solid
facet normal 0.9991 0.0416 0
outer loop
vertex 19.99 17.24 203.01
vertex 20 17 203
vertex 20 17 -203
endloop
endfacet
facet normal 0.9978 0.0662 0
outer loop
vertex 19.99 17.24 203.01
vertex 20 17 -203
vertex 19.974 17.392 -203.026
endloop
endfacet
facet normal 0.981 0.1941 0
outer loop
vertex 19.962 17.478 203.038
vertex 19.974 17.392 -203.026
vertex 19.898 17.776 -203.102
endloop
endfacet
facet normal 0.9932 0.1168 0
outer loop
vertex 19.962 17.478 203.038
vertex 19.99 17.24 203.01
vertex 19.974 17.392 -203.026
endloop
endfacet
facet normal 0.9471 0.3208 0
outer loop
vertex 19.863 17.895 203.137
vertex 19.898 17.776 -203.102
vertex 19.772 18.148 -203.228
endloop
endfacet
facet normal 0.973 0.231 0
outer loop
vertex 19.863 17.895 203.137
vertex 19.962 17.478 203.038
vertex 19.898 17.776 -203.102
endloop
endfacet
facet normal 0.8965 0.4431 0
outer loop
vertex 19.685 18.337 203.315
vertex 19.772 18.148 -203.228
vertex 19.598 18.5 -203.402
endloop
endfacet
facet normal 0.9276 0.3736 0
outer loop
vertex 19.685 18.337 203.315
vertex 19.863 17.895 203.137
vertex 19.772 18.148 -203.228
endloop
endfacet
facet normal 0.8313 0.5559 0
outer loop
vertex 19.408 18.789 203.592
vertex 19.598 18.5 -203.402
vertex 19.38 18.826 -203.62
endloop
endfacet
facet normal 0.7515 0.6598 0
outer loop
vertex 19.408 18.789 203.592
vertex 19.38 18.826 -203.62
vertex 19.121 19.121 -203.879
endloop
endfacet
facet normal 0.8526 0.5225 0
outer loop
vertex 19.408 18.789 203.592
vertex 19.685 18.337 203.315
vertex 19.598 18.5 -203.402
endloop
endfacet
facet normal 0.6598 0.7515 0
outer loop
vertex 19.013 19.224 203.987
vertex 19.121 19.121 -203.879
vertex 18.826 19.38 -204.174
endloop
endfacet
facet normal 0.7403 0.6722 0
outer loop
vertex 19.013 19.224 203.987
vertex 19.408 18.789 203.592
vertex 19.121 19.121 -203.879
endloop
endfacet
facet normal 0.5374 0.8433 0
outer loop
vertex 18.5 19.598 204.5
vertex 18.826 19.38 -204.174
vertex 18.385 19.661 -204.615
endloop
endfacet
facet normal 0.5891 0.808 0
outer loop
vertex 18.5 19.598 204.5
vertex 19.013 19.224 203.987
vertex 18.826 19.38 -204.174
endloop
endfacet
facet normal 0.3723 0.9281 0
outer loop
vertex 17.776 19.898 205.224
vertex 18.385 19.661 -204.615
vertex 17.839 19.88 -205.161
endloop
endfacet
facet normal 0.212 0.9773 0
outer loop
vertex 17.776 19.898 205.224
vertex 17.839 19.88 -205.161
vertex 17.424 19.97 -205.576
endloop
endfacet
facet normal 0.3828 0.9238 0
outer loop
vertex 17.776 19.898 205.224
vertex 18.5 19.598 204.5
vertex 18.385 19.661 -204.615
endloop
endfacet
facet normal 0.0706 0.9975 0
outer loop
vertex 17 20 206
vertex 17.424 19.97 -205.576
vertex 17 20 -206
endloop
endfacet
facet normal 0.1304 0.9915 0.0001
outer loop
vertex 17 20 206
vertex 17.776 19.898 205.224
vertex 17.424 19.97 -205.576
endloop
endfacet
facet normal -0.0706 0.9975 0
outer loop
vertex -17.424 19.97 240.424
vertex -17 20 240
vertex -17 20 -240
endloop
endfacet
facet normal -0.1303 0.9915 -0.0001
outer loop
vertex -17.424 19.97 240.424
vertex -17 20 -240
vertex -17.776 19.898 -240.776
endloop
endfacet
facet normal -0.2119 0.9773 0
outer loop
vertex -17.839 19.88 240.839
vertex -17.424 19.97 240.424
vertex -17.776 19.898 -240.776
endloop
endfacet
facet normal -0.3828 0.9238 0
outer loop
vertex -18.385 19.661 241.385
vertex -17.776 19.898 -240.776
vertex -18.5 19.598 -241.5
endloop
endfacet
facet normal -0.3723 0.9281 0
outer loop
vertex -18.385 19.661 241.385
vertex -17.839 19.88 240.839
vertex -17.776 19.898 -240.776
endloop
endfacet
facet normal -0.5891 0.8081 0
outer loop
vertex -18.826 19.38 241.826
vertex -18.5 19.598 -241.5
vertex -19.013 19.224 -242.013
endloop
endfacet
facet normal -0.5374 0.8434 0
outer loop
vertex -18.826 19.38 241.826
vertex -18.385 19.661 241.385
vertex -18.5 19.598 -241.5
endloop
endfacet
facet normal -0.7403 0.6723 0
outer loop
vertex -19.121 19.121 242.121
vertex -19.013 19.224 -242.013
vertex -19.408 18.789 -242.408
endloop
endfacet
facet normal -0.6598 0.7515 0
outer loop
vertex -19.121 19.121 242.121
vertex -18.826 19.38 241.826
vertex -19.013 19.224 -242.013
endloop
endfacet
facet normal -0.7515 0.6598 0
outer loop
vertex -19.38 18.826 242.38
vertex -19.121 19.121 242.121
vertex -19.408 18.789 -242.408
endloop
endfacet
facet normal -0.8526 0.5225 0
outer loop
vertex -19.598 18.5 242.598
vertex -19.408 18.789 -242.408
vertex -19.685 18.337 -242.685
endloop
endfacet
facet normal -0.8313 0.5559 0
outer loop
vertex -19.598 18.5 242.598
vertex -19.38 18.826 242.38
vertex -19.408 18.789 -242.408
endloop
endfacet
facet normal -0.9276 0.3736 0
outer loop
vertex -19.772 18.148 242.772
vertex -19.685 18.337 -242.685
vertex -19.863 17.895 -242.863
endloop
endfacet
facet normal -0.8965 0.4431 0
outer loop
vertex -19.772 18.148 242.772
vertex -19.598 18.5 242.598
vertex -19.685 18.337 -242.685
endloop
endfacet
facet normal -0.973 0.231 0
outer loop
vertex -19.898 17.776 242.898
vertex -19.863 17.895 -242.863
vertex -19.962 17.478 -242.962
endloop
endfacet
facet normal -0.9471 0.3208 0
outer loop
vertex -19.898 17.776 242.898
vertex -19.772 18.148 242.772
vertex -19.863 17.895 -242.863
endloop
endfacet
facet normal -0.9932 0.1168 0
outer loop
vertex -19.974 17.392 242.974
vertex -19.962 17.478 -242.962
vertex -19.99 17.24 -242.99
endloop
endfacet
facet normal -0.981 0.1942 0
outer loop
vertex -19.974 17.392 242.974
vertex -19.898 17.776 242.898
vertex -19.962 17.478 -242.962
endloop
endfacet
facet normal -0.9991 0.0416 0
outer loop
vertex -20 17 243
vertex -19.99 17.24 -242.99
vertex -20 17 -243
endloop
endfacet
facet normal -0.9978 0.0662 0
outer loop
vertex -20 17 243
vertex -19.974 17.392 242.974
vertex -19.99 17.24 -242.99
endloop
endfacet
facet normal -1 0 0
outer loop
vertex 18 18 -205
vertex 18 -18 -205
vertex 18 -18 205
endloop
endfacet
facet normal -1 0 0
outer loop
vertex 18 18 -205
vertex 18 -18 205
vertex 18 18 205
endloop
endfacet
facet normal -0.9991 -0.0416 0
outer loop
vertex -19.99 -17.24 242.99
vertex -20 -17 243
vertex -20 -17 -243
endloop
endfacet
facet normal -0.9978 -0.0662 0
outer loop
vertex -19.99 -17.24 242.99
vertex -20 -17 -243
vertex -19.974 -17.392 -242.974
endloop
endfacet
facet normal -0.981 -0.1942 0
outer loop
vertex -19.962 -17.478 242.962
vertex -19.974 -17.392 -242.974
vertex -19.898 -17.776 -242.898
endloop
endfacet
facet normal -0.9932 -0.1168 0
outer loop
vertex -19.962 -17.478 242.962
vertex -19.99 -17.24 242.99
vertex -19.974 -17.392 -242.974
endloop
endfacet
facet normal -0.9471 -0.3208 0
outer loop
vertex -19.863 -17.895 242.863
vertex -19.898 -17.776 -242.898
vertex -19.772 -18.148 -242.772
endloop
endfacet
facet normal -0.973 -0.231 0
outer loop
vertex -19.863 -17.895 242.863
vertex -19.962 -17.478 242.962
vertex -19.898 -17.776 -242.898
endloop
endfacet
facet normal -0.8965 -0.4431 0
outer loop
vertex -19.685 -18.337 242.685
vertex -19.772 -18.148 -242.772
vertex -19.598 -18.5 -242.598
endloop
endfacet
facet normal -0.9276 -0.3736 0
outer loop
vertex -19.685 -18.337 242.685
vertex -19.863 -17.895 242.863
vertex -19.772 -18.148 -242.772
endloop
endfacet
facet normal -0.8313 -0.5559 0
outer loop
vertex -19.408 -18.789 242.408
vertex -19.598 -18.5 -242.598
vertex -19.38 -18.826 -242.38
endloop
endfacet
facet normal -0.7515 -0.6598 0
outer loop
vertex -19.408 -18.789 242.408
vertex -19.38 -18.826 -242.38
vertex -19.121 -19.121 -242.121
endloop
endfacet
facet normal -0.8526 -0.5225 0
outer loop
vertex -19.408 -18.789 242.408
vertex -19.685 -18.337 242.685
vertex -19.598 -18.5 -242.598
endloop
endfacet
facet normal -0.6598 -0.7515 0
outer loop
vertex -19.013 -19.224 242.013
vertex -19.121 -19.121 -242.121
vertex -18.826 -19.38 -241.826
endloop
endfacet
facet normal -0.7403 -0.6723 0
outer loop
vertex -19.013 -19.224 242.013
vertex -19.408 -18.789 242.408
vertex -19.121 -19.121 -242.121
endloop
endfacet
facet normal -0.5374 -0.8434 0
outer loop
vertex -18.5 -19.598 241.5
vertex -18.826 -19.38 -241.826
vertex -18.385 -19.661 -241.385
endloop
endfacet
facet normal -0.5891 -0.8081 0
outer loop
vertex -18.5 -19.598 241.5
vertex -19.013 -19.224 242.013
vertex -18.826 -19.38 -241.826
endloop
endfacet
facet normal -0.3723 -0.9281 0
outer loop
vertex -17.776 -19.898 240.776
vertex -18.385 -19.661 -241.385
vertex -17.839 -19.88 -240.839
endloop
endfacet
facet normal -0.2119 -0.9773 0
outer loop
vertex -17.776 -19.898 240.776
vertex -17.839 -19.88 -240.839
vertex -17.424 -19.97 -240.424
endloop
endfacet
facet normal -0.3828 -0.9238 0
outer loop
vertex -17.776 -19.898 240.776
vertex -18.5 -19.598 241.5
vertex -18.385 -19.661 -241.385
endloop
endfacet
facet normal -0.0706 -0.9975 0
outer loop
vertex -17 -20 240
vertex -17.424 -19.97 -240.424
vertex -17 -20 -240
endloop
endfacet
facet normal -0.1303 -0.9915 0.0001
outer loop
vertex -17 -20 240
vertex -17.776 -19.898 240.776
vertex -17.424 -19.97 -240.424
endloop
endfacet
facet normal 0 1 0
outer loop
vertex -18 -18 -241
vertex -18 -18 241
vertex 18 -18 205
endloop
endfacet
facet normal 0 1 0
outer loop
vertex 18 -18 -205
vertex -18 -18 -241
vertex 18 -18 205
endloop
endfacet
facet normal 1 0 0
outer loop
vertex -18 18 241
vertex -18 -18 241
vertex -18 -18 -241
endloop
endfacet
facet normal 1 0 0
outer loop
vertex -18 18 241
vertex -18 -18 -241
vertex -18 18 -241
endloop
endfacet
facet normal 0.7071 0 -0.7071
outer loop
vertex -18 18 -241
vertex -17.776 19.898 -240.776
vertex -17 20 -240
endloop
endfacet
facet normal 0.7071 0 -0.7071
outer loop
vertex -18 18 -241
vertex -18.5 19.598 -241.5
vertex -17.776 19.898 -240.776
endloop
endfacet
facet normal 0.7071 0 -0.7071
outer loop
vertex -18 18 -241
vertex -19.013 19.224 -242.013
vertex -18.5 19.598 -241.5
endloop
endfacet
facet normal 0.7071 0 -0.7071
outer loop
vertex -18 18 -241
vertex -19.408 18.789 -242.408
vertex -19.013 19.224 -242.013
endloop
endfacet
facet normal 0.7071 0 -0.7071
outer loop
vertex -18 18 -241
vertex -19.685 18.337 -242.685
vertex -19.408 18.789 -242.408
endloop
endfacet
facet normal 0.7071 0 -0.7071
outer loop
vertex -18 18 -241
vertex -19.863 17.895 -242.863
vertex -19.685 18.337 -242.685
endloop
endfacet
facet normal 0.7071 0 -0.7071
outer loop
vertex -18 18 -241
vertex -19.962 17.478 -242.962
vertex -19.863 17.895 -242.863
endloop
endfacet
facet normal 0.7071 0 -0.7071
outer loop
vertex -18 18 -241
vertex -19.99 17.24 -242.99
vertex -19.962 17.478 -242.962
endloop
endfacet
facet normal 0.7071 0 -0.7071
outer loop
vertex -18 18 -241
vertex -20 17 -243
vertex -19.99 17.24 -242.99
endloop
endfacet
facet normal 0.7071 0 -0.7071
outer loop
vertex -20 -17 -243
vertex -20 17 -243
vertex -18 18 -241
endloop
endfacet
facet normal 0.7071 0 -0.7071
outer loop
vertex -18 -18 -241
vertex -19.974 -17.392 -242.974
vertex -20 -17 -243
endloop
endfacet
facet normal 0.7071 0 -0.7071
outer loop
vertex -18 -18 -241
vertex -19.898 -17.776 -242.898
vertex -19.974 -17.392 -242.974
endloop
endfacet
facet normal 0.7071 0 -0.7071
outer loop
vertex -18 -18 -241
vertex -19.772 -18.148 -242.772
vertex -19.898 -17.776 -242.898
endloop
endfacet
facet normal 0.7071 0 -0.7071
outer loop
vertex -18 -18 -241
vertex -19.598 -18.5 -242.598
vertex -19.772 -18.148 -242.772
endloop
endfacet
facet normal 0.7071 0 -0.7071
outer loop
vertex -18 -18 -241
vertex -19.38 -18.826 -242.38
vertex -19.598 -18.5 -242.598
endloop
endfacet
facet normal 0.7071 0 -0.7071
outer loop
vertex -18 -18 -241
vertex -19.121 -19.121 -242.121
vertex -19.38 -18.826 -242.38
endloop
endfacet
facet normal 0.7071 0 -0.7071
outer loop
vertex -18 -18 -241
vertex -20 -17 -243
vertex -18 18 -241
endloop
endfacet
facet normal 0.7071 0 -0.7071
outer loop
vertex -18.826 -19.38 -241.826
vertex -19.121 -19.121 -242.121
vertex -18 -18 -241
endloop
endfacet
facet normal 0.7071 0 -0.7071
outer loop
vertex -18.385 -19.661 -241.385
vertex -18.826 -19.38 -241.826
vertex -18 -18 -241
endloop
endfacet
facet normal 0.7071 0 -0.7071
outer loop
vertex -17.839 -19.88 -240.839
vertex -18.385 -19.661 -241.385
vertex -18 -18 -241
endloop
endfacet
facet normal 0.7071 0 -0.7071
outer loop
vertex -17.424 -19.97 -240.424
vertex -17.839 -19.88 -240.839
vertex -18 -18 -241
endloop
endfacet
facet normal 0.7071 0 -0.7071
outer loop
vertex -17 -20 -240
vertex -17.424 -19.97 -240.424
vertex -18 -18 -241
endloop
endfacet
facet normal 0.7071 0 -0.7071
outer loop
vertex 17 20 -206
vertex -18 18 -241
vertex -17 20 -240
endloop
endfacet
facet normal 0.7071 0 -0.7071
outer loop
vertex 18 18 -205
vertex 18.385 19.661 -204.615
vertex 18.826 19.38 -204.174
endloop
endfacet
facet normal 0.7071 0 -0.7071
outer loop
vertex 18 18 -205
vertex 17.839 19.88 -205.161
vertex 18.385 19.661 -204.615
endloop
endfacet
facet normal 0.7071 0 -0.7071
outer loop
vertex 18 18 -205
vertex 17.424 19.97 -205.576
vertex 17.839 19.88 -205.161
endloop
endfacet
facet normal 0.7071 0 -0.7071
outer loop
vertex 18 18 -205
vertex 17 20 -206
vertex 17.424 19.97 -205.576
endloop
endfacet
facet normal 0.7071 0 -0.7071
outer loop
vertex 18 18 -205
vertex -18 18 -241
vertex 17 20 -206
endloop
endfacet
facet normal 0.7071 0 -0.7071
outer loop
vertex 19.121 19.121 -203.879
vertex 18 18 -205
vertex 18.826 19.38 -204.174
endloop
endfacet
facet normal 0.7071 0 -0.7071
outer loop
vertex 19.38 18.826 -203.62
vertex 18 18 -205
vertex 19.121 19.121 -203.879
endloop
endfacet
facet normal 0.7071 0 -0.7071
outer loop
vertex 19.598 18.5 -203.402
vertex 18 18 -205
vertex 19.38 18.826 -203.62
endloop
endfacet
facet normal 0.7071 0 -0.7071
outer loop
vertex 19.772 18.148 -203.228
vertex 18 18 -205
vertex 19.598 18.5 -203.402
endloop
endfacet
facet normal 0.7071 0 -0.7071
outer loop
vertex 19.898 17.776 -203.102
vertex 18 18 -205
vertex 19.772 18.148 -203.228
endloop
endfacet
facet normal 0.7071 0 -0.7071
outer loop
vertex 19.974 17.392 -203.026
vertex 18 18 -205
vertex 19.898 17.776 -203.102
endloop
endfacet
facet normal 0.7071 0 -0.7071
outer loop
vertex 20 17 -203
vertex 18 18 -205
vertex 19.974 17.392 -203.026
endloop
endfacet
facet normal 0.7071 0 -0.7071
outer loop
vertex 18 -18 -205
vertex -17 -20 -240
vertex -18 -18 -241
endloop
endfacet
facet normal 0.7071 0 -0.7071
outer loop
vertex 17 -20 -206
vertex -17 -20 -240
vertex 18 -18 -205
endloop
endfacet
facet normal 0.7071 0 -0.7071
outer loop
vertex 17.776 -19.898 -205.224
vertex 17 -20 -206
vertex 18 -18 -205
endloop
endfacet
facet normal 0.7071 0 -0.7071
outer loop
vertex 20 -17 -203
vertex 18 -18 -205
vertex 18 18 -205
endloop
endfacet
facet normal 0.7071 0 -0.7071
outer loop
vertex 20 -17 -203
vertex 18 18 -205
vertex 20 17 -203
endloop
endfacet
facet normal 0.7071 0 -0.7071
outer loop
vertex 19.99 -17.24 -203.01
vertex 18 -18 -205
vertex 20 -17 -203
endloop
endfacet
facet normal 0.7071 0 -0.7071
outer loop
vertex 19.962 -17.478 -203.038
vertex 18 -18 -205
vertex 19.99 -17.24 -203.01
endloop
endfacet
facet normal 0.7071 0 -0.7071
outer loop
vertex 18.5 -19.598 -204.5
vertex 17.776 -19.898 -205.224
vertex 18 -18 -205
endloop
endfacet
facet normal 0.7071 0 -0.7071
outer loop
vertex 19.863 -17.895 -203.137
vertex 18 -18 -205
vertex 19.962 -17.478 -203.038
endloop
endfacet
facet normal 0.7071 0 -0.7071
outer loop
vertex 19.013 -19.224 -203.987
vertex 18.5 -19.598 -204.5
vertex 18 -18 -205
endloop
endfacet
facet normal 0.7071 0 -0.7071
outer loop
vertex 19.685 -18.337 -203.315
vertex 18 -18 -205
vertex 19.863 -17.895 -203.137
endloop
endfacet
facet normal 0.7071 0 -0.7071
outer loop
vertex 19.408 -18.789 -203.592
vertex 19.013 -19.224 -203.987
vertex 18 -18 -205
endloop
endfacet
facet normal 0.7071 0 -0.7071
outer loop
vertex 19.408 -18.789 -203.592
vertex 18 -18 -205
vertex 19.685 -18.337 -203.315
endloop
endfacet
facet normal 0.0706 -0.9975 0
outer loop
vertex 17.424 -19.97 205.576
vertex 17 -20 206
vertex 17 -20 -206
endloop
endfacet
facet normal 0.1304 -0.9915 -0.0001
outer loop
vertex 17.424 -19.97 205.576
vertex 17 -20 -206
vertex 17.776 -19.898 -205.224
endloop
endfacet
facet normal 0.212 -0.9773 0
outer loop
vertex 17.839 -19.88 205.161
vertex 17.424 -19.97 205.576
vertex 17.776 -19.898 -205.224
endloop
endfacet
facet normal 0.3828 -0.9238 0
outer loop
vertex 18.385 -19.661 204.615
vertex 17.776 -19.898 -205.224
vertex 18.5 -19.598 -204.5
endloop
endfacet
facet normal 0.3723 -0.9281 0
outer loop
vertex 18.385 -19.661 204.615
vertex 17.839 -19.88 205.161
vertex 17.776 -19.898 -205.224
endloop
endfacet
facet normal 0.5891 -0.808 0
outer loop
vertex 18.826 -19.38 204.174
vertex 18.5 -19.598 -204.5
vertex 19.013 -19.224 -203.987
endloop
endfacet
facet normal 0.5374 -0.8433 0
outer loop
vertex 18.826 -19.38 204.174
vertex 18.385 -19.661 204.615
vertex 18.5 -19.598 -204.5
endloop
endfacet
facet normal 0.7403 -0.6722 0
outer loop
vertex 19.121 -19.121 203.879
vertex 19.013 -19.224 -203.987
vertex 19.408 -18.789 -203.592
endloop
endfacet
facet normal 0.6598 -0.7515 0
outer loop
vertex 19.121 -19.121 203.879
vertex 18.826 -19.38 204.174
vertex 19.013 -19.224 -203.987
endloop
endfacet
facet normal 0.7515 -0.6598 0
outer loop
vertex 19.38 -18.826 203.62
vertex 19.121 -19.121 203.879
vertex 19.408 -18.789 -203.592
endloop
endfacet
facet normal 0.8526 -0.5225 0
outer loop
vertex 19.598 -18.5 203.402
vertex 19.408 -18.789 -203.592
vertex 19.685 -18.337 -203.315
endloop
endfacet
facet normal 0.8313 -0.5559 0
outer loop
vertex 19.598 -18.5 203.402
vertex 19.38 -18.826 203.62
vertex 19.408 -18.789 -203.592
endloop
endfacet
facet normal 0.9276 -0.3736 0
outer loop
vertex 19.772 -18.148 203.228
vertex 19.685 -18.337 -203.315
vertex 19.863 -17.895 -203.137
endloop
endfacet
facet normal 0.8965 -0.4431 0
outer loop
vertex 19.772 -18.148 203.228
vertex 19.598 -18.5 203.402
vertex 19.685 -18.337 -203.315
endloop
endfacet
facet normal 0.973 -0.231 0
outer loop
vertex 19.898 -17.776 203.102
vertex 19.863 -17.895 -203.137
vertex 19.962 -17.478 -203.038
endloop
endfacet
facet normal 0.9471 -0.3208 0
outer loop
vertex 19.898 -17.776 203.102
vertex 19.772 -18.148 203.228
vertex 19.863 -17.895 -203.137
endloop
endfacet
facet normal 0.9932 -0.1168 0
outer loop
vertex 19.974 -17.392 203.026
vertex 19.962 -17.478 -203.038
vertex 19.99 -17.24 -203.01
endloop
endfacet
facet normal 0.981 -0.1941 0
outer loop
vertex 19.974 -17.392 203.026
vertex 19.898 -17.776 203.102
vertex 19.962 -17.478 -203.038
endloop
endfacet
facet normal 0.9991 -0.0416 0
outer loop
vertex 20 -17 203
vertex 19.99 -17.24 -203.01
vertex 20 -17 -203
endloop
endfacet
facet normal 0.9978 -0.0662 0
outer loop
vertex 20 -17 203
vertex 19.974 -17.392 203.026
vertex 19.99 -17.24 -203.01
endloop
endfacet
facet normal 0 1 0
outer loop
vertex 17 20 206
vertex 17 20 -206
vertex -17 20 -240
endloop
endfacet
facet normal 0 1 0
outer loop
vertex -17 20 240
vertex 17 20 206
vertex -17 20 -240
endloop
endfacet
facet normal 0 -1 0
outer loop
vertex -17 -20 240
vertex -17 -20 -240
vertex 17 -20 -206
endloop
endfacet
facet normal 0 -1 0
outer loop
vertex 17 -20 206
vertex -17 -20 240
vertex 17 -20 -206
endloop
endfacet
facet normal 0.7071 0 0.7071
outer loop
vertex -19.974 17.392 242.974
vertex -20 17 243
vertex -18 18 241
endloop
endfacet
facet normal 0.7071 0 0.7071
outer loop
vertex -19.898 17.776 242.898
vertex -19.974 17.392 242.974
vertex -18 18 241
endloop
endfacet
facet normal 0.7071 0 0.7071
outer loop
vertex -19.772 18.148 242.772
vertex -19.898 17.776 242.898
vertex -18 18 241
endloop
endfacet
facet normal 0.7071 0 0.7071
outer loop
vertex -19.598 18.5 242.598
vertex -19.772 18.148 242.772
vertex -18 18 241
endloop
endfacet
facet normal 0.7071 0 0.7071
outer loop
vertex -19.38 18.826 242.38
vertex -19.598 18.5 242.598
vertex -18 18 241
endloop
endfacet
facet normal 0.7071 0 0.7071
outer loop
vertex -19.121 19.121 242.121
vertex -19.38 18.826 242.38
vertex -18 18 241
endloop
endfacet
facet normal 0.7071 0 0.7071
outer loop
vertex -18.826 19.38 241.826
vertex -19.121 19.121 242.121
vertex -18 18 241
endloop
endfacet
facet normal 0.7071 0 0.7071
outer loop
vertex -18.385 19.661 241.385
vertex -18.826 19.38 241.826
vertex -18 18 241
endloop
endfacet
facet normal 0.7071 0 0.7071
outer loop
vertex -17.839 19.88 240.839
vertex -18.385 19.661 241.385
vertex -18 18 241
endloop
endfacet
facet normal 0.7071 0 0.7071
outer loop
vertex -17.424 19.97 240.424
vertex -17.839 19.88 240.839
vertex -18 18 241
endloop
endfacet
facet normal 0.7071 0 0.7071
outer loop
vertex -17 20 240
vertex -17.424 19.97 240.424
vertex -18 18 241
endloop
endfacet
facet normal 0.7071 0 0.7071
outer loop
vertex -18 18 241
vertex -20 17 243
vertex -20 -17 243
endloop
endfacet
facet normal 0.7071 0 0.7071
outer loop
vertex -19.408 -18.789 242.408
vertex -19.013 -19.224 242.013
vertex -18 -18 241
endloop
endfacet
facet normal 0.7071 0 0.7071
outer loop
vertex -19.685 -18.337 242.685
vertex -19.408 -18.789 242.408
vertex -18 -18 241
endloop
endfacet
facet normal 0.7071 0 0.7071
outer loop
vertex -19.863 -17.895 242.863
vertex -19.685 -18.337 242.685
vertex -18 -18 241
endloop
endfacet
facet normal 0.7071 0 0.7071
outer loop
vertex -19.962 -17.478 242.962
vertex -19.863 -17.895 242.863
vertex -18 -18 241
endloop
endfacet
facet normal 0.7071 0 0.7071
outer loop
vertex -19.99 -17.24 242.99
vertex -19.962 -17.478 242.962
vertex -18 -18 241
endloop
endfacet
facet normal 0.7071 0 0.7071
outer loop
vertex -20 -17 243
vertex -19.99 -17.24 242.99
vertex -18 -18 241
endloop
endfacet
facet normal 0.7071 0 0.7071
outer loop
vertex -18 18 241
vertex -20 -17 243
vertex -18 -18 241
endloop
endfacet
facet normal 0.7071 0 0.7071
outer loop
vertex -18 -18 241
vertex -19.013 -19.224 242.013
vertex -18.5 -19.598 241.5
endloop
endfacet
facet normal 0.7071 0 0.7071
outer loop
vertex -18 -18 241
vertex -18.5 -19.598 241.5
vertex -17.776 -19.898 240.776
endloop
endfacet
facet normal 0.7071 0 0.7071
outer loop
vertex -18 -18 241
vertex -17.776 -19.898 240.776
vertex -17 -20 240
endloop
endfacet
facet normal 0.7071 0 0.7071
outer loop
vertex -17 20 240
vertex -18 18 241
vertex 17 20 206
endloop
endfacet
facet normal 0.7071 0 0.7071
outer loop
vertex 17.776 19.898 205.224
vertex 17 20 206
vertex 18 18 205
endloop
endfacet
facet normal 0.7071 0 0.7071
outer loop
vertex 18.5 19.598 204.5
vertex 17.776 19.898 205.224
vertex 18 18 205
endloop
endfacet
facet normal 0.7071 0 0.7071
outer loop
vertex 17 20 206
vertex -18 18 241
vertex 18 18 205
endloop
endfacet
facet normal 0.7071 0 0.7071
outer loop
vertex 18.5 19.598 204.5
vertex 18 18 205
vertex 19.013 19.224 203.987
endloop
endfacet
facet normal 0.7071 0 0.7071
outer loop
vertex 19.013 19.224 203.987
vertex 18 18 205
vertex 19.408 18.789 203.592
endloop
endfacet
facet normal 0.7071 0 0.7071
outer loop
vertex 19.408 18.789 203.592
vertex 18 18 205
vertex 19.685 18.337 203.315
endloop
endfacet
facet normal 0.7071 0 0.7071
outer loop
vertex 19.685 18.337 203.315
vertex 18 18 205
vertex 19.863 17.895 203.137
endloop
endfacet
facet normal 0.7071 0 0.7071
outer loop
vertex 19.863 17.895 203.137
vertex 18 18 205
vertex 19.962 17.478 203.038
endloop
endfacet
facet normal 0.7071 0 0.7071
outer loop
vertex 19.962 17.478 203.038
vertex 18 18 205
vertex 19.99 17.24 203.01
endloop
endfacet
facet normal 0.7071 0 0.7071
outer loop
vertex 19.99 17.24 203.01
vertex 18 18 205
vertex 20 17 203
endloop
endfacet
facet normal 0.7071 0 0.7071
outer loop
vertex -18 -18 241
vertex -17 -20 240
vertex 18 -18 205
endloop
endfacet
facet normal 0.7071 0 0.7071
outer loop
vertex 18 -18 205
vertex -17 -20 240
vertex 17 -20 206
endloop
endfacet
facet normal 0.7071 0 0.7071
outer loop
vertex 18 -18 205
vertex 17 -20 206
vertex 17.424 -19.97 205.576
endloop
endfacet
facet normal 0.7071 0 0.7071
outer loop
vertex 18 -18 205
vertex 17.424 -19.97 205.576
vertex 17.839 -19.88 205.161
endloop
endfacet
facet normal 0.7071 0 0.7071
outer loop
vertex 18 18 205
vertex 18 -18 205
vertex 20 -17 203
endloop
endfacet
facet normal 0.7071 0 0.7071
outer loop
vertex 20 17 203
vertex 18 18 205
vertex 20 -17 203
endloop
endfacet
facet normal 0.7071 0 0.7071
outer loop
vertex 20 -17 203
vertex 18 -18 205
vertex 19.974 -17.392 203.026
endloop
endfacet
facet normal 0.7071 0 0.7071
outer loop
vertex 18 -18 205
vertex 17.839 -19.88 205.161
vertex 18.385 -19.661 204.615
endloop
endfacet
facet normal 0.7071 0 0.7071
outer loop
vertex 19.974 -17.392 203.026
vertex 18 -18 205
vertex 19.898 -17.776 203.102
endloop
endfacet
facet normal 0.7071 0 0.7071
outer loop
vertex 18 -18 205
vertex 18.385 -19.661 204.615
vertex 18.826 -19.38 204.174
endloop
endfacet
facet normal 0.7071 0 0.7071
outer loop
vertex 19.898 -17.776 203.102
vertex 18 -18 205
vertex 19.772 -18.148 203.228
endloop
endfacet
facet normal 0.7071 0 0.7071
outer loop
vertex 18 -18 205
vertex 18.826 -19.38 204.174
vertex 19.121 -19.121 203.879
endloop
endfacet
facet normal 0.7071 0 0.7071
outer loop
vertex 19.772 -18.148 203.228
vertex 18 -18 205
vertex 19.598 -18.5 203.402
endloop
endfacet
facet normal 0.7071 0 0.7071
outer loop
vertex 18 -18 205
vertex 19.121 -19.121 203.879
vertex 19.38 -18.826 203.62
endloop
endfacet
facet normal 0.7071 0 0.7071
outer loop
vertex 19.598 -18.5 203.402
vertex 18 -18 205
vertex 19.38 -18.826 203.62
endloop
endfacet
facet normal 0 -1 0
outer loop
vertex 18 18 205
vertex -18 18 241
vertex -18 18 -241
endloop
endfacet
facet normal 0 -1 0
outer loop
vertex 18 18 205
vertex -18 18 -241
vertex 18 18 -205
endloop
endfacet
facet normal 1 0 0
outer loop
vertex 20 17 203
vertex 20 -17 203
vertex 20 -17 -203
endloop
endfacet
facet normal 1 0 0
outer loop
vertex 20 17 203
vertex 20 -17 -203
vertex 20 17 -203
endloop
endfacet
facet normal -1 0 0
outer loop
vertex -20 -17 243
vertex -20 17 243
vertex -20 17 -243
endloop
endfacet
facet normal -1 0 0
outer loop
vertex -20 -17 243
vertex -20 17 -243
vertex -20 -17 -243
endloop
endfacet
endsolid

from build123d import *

# Parameters (mm, degrees)
F0_W     = 36
F0_H     = 36
F1_DEPTH = 243
F3_DEPTH = 40.001


# Not quite as in the source:
# - a pattern or mirror of a feature is missing from the dataset's text; its kind, count and spacing are read off the source's solid


with BuildPart() as f1:
    # F0 (on Top) → F1 (new body, symmetric)
    with BuildSketch(Plane.XY):
        with BuildLine():
            Line((17, 20), (-17, 20))
            ThreePointArc((-17, 20), (-19.1213203436, 19.1213203436), (-20, 17))
            Line((-20, 17), (-20, -17))
            ThreePointArc((-20, -17), (-19.1213203436, -19.1213203436), (-17, -20))
            Line((-17, -20), (17, -20))
            ThreePointArc((17, -20), (19.1213203436, -19.1213203436), (20, -17))
            Line((20, -17), (20, 17))
            ThreePointArc((20, 17), (19.1213203436, 19.1213203436), (17, 20))
        make_face()
        Rectangle(F0_W, F0_H, mode=Mode.SUBTRACT)
    extrude(amount=F1_DEPTH, both=True)

    # F2 (on face) → F3 (cut, through all)
    with BuildSketch(Plane.XZ.offset(20)):
        Polygon((20, 243), (-20, 243), (20, 203), align=None)
    f3 = extrude(amount=-F3_DEPTH, mode=Mode.SUBTRACT)

    # F3_copies: F3 across plane
    add(f3.mirror(Plane(origin=(0, 0, 0), x_dir=(-1, 0, 0), z_dir=(0, 0, -1))), mode=Mode.SUBTRACT)


solid = f1.part
